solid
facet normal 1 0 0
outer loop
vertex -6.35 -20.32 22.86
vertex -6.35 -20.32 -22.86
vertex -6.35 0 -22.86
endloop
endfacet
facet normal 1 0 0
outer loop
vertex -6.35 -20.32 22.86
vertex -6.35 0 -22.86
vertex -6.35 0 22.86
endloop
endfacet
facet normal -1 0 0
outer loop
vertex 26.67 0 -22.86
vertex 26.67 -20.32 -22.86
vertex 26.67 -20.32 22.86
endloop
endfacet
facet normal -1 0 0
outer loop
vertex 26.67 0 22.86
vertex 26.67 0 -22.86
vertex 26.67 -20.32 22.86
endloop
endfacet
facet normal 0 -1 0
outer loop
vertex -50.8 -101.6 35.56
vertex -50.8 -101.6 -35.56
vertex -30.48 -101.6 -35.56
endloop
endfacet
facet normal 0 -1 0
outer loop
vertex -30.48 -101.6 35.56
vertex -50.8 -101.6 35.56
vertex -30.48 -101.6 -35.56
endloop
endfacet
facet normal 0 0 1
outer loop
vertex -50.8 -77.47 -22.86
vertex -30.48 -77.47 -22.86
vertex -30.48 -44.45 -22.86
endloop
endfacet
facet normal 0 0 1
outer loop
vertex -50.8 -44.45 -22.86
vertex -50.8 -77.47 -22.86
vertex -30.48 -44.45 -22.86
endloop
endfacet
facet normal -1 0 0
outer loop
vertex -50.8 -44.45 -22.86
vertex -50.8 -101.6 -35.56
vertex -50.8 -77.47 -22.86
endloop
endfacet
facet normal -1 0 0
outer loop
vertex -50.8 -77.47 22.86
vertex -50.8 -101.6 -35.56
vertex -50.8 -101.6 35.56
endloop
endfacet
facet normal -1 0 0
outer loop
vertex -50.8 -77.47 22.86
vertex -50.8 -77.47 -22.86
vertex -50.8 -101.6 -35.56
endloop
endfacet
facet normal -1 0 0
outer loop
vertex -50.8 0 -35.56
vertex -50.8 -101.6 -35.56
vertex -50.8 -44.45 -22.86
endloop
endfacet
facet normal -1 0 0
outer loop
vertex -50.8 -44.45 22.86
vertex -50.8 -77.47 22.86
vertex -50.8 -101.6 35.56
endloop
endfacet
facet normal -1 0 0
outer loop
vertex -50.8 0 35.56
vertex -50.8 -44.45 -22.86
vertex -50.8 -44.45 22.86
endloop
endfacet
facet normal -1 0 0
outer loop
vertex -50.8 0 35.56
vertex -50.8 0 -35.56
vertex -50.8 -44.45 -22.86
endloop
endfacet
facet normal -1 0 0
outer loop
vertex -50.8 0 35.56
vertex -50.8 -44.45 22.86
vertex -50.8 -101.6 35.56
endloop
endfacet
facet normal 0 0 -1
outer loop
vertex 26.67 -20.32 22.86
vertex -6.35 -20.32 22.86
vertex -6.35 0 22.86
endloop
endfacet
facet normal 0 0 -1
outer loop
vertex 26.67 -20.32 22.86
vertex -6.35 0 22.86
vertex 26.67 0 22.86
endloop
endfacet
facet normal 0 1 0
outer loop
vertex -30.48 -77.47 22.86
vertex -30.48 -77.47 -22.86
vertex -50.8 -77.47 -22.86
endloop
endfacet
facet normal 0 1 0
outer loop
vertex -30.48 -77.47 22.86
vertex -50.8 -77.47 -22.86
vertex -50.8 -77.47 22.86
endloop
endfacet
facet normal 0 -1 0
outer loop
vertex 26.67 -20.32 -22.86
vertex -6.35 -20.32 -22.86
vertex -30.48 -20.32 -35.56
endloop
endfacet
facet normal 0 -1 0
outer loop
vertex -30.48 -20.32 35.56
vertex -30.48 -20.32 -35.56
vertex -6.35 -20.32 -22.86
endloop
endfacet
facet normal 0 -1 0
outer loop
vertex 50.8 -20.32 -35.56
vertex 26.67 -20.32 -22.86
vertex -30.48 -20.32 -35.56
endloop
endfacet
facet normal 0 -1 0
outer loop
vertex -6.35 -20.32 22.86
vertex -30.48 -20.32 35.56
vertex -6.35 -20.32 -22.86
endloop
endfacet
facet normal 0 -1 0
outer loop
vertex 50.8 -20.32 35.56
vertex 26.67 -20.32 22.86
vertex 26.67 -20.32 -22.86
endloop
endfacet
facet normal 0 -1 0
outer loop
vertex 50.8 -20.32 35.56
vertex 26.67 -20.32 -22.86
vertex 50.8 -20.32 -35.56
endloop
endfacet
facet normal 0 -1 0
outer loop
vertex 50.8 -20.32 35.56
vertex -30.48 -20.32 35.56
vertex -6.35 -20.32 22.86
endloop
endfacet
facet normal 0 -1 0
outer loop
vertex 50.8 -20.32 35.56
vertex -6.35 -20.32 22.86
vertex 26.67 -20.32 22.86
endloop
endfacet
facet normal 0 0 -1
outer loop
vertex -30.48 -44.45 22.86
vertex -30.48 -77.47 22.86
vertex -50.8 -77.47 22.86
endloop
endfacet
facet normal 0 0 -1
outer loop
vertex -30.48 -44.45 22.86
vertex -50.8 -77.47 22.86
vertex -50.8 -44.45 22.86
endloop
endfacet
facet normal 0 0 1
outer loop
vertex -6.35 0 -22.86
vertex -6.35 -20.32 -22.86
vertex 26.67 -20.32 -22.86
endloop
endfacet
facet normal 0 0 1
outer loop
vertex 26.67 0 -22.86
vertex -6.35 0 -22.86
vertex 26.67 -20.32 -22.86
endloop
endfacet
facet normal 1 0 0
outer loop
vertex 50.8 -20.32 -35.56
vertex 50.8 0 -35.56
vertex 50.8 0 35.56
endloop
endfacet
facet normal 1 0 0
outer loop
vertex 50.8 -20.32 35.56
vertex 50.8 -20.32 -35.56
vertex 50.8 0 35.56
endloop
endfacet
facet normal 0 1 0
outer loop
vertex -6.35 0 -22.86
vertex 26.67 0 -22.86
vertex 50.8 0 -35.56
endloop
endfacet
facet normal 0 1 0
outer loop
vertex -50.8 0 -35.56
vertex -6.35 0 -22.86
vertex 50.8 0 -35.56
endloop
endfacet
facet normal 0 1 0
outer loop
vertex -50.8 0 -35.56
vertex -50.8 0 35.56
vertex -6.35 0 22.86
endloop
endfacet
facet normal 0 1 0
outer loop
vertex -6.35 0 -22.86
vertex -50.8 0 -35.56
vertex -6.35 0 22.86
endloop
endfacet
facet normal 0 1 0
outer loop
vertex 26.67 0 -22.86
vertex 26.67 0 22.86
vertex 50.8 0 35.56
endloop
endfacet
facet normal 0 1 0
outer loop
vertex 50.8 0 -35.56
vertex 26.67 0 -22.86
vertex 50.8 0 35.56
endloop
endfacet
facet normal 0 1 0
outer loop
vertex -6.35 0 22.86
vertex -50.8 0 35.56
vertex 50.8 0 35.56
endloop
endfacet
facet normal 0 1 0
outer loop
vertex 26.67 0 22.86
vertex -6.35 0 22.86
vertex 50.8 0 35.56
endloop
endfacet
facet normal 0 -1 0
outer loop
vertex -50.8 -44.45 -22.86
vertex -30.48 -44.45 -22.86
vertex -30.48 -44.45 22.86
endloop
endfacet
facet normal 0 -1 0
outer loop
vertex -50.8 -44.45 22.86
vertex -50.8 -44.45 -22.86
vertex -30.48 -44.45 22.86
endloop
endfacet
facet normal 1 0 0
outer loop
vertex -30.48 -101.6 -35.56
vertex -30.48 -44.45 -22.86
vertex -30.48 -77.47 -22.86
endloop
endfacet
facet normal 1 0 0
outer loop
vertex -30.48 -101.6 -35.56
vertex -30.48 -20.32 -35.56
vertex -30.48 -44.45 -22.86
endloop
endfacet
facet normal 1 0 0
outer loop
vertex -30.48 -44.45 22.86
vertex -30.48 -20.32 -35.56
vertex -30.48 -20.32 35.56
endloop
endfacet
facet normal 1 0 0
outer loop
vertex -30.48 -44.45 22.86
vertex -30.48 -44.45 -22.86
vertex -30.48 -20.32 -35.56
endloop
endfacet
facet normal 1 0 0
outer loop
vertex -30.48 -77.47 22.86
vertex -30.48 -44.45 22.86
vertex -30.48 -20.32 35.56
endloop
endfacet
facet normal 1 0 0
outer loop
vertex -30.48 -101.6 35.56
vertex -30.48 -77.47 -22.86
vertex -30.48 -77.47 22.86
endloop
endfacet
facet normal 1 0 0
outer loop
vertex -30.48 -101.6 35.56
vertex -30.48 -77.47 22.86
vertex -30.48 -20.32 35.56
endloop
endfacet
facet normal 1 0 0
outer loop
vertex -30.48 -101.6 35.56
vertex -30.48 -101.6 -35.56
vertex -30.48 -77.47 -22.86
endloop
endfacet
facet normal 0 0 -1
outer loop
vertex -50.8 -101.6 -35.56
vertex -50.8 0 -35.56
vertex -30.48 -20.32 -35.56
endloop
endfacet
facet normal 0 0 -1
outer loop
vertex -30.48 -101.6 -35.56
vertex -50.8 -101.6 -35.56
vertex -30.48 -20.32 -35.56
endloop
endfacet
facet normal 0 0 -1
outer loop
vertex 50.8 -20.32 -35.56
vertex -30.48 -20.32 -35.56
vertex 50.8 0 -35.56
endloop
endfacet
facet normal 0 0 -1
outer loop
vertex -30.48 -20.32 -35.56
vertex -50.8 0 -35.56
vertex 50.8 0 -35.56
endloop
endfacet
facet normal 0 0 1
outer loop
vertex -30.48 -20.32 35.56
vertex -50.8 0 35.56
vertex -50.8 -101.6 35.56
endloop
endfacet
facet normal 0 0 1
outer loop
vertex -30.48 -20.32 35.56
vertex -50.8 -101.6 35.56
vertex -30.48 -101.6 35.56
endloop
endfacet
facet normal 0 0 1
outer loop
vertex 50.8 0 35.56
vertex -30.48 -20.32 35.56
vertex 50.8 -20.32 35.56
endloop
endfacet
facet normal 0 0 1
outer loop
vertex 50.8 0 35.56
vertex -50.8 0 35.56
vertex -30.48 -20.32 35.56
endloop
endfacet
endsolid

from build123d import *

# Parameters (mm, degrees)
F0_W     = 101.6
F0_H     = 71.12
F1_DEPTH = 101.6
F2_W     = 81.28
F2_H     = 71.12
F3_DEPTH = 81.28
F4_W     = 33.02
F4_H     = 45.72
F5_DEPTH = 20.321
F6_W     = 33.02
F6_H     = 45.72
F7_DEPTH = 20.321


with BuildPart() as f1:
    # F0 (on Front) → F1 (new body)
    with BuildSketch(Plane.XZ):
        Rectangle(F0_W, F0_H)
    extrude(amount=F1_DEPTH)

    # F2 (on face) → F3 (cut)
    with BuildSketch(Plane.XZ.offset(101.6)):
        with Locations((10.16, 0)):
            Rectangle(F2_W, F2_H)
    extrude(amount=-F3_DEPTH, mode=Mode.SUBTRACT)

    # F4 (on face) → F5 (cut, through all)
    with BuildSketch(Plane.XZ.offset(20.32)):
        with Locations((10.16, 0)):
            Rectangle(F4_W, F4_H)
    extrude(amount=-F5_DEPTH, mode=Mode.SUBTRACT)

    # F6 (on face) → F7 (cut, through all)
    with BuildSketch(Plane.YZ.offset(-30.48)):
        with Locations((-60.96, 0)):
            Rectangle(F6_W, F6_H)
    extrude(amount=-F7_DEPTH, mode=Mode.SUBTRACT)


solid = f1.part
